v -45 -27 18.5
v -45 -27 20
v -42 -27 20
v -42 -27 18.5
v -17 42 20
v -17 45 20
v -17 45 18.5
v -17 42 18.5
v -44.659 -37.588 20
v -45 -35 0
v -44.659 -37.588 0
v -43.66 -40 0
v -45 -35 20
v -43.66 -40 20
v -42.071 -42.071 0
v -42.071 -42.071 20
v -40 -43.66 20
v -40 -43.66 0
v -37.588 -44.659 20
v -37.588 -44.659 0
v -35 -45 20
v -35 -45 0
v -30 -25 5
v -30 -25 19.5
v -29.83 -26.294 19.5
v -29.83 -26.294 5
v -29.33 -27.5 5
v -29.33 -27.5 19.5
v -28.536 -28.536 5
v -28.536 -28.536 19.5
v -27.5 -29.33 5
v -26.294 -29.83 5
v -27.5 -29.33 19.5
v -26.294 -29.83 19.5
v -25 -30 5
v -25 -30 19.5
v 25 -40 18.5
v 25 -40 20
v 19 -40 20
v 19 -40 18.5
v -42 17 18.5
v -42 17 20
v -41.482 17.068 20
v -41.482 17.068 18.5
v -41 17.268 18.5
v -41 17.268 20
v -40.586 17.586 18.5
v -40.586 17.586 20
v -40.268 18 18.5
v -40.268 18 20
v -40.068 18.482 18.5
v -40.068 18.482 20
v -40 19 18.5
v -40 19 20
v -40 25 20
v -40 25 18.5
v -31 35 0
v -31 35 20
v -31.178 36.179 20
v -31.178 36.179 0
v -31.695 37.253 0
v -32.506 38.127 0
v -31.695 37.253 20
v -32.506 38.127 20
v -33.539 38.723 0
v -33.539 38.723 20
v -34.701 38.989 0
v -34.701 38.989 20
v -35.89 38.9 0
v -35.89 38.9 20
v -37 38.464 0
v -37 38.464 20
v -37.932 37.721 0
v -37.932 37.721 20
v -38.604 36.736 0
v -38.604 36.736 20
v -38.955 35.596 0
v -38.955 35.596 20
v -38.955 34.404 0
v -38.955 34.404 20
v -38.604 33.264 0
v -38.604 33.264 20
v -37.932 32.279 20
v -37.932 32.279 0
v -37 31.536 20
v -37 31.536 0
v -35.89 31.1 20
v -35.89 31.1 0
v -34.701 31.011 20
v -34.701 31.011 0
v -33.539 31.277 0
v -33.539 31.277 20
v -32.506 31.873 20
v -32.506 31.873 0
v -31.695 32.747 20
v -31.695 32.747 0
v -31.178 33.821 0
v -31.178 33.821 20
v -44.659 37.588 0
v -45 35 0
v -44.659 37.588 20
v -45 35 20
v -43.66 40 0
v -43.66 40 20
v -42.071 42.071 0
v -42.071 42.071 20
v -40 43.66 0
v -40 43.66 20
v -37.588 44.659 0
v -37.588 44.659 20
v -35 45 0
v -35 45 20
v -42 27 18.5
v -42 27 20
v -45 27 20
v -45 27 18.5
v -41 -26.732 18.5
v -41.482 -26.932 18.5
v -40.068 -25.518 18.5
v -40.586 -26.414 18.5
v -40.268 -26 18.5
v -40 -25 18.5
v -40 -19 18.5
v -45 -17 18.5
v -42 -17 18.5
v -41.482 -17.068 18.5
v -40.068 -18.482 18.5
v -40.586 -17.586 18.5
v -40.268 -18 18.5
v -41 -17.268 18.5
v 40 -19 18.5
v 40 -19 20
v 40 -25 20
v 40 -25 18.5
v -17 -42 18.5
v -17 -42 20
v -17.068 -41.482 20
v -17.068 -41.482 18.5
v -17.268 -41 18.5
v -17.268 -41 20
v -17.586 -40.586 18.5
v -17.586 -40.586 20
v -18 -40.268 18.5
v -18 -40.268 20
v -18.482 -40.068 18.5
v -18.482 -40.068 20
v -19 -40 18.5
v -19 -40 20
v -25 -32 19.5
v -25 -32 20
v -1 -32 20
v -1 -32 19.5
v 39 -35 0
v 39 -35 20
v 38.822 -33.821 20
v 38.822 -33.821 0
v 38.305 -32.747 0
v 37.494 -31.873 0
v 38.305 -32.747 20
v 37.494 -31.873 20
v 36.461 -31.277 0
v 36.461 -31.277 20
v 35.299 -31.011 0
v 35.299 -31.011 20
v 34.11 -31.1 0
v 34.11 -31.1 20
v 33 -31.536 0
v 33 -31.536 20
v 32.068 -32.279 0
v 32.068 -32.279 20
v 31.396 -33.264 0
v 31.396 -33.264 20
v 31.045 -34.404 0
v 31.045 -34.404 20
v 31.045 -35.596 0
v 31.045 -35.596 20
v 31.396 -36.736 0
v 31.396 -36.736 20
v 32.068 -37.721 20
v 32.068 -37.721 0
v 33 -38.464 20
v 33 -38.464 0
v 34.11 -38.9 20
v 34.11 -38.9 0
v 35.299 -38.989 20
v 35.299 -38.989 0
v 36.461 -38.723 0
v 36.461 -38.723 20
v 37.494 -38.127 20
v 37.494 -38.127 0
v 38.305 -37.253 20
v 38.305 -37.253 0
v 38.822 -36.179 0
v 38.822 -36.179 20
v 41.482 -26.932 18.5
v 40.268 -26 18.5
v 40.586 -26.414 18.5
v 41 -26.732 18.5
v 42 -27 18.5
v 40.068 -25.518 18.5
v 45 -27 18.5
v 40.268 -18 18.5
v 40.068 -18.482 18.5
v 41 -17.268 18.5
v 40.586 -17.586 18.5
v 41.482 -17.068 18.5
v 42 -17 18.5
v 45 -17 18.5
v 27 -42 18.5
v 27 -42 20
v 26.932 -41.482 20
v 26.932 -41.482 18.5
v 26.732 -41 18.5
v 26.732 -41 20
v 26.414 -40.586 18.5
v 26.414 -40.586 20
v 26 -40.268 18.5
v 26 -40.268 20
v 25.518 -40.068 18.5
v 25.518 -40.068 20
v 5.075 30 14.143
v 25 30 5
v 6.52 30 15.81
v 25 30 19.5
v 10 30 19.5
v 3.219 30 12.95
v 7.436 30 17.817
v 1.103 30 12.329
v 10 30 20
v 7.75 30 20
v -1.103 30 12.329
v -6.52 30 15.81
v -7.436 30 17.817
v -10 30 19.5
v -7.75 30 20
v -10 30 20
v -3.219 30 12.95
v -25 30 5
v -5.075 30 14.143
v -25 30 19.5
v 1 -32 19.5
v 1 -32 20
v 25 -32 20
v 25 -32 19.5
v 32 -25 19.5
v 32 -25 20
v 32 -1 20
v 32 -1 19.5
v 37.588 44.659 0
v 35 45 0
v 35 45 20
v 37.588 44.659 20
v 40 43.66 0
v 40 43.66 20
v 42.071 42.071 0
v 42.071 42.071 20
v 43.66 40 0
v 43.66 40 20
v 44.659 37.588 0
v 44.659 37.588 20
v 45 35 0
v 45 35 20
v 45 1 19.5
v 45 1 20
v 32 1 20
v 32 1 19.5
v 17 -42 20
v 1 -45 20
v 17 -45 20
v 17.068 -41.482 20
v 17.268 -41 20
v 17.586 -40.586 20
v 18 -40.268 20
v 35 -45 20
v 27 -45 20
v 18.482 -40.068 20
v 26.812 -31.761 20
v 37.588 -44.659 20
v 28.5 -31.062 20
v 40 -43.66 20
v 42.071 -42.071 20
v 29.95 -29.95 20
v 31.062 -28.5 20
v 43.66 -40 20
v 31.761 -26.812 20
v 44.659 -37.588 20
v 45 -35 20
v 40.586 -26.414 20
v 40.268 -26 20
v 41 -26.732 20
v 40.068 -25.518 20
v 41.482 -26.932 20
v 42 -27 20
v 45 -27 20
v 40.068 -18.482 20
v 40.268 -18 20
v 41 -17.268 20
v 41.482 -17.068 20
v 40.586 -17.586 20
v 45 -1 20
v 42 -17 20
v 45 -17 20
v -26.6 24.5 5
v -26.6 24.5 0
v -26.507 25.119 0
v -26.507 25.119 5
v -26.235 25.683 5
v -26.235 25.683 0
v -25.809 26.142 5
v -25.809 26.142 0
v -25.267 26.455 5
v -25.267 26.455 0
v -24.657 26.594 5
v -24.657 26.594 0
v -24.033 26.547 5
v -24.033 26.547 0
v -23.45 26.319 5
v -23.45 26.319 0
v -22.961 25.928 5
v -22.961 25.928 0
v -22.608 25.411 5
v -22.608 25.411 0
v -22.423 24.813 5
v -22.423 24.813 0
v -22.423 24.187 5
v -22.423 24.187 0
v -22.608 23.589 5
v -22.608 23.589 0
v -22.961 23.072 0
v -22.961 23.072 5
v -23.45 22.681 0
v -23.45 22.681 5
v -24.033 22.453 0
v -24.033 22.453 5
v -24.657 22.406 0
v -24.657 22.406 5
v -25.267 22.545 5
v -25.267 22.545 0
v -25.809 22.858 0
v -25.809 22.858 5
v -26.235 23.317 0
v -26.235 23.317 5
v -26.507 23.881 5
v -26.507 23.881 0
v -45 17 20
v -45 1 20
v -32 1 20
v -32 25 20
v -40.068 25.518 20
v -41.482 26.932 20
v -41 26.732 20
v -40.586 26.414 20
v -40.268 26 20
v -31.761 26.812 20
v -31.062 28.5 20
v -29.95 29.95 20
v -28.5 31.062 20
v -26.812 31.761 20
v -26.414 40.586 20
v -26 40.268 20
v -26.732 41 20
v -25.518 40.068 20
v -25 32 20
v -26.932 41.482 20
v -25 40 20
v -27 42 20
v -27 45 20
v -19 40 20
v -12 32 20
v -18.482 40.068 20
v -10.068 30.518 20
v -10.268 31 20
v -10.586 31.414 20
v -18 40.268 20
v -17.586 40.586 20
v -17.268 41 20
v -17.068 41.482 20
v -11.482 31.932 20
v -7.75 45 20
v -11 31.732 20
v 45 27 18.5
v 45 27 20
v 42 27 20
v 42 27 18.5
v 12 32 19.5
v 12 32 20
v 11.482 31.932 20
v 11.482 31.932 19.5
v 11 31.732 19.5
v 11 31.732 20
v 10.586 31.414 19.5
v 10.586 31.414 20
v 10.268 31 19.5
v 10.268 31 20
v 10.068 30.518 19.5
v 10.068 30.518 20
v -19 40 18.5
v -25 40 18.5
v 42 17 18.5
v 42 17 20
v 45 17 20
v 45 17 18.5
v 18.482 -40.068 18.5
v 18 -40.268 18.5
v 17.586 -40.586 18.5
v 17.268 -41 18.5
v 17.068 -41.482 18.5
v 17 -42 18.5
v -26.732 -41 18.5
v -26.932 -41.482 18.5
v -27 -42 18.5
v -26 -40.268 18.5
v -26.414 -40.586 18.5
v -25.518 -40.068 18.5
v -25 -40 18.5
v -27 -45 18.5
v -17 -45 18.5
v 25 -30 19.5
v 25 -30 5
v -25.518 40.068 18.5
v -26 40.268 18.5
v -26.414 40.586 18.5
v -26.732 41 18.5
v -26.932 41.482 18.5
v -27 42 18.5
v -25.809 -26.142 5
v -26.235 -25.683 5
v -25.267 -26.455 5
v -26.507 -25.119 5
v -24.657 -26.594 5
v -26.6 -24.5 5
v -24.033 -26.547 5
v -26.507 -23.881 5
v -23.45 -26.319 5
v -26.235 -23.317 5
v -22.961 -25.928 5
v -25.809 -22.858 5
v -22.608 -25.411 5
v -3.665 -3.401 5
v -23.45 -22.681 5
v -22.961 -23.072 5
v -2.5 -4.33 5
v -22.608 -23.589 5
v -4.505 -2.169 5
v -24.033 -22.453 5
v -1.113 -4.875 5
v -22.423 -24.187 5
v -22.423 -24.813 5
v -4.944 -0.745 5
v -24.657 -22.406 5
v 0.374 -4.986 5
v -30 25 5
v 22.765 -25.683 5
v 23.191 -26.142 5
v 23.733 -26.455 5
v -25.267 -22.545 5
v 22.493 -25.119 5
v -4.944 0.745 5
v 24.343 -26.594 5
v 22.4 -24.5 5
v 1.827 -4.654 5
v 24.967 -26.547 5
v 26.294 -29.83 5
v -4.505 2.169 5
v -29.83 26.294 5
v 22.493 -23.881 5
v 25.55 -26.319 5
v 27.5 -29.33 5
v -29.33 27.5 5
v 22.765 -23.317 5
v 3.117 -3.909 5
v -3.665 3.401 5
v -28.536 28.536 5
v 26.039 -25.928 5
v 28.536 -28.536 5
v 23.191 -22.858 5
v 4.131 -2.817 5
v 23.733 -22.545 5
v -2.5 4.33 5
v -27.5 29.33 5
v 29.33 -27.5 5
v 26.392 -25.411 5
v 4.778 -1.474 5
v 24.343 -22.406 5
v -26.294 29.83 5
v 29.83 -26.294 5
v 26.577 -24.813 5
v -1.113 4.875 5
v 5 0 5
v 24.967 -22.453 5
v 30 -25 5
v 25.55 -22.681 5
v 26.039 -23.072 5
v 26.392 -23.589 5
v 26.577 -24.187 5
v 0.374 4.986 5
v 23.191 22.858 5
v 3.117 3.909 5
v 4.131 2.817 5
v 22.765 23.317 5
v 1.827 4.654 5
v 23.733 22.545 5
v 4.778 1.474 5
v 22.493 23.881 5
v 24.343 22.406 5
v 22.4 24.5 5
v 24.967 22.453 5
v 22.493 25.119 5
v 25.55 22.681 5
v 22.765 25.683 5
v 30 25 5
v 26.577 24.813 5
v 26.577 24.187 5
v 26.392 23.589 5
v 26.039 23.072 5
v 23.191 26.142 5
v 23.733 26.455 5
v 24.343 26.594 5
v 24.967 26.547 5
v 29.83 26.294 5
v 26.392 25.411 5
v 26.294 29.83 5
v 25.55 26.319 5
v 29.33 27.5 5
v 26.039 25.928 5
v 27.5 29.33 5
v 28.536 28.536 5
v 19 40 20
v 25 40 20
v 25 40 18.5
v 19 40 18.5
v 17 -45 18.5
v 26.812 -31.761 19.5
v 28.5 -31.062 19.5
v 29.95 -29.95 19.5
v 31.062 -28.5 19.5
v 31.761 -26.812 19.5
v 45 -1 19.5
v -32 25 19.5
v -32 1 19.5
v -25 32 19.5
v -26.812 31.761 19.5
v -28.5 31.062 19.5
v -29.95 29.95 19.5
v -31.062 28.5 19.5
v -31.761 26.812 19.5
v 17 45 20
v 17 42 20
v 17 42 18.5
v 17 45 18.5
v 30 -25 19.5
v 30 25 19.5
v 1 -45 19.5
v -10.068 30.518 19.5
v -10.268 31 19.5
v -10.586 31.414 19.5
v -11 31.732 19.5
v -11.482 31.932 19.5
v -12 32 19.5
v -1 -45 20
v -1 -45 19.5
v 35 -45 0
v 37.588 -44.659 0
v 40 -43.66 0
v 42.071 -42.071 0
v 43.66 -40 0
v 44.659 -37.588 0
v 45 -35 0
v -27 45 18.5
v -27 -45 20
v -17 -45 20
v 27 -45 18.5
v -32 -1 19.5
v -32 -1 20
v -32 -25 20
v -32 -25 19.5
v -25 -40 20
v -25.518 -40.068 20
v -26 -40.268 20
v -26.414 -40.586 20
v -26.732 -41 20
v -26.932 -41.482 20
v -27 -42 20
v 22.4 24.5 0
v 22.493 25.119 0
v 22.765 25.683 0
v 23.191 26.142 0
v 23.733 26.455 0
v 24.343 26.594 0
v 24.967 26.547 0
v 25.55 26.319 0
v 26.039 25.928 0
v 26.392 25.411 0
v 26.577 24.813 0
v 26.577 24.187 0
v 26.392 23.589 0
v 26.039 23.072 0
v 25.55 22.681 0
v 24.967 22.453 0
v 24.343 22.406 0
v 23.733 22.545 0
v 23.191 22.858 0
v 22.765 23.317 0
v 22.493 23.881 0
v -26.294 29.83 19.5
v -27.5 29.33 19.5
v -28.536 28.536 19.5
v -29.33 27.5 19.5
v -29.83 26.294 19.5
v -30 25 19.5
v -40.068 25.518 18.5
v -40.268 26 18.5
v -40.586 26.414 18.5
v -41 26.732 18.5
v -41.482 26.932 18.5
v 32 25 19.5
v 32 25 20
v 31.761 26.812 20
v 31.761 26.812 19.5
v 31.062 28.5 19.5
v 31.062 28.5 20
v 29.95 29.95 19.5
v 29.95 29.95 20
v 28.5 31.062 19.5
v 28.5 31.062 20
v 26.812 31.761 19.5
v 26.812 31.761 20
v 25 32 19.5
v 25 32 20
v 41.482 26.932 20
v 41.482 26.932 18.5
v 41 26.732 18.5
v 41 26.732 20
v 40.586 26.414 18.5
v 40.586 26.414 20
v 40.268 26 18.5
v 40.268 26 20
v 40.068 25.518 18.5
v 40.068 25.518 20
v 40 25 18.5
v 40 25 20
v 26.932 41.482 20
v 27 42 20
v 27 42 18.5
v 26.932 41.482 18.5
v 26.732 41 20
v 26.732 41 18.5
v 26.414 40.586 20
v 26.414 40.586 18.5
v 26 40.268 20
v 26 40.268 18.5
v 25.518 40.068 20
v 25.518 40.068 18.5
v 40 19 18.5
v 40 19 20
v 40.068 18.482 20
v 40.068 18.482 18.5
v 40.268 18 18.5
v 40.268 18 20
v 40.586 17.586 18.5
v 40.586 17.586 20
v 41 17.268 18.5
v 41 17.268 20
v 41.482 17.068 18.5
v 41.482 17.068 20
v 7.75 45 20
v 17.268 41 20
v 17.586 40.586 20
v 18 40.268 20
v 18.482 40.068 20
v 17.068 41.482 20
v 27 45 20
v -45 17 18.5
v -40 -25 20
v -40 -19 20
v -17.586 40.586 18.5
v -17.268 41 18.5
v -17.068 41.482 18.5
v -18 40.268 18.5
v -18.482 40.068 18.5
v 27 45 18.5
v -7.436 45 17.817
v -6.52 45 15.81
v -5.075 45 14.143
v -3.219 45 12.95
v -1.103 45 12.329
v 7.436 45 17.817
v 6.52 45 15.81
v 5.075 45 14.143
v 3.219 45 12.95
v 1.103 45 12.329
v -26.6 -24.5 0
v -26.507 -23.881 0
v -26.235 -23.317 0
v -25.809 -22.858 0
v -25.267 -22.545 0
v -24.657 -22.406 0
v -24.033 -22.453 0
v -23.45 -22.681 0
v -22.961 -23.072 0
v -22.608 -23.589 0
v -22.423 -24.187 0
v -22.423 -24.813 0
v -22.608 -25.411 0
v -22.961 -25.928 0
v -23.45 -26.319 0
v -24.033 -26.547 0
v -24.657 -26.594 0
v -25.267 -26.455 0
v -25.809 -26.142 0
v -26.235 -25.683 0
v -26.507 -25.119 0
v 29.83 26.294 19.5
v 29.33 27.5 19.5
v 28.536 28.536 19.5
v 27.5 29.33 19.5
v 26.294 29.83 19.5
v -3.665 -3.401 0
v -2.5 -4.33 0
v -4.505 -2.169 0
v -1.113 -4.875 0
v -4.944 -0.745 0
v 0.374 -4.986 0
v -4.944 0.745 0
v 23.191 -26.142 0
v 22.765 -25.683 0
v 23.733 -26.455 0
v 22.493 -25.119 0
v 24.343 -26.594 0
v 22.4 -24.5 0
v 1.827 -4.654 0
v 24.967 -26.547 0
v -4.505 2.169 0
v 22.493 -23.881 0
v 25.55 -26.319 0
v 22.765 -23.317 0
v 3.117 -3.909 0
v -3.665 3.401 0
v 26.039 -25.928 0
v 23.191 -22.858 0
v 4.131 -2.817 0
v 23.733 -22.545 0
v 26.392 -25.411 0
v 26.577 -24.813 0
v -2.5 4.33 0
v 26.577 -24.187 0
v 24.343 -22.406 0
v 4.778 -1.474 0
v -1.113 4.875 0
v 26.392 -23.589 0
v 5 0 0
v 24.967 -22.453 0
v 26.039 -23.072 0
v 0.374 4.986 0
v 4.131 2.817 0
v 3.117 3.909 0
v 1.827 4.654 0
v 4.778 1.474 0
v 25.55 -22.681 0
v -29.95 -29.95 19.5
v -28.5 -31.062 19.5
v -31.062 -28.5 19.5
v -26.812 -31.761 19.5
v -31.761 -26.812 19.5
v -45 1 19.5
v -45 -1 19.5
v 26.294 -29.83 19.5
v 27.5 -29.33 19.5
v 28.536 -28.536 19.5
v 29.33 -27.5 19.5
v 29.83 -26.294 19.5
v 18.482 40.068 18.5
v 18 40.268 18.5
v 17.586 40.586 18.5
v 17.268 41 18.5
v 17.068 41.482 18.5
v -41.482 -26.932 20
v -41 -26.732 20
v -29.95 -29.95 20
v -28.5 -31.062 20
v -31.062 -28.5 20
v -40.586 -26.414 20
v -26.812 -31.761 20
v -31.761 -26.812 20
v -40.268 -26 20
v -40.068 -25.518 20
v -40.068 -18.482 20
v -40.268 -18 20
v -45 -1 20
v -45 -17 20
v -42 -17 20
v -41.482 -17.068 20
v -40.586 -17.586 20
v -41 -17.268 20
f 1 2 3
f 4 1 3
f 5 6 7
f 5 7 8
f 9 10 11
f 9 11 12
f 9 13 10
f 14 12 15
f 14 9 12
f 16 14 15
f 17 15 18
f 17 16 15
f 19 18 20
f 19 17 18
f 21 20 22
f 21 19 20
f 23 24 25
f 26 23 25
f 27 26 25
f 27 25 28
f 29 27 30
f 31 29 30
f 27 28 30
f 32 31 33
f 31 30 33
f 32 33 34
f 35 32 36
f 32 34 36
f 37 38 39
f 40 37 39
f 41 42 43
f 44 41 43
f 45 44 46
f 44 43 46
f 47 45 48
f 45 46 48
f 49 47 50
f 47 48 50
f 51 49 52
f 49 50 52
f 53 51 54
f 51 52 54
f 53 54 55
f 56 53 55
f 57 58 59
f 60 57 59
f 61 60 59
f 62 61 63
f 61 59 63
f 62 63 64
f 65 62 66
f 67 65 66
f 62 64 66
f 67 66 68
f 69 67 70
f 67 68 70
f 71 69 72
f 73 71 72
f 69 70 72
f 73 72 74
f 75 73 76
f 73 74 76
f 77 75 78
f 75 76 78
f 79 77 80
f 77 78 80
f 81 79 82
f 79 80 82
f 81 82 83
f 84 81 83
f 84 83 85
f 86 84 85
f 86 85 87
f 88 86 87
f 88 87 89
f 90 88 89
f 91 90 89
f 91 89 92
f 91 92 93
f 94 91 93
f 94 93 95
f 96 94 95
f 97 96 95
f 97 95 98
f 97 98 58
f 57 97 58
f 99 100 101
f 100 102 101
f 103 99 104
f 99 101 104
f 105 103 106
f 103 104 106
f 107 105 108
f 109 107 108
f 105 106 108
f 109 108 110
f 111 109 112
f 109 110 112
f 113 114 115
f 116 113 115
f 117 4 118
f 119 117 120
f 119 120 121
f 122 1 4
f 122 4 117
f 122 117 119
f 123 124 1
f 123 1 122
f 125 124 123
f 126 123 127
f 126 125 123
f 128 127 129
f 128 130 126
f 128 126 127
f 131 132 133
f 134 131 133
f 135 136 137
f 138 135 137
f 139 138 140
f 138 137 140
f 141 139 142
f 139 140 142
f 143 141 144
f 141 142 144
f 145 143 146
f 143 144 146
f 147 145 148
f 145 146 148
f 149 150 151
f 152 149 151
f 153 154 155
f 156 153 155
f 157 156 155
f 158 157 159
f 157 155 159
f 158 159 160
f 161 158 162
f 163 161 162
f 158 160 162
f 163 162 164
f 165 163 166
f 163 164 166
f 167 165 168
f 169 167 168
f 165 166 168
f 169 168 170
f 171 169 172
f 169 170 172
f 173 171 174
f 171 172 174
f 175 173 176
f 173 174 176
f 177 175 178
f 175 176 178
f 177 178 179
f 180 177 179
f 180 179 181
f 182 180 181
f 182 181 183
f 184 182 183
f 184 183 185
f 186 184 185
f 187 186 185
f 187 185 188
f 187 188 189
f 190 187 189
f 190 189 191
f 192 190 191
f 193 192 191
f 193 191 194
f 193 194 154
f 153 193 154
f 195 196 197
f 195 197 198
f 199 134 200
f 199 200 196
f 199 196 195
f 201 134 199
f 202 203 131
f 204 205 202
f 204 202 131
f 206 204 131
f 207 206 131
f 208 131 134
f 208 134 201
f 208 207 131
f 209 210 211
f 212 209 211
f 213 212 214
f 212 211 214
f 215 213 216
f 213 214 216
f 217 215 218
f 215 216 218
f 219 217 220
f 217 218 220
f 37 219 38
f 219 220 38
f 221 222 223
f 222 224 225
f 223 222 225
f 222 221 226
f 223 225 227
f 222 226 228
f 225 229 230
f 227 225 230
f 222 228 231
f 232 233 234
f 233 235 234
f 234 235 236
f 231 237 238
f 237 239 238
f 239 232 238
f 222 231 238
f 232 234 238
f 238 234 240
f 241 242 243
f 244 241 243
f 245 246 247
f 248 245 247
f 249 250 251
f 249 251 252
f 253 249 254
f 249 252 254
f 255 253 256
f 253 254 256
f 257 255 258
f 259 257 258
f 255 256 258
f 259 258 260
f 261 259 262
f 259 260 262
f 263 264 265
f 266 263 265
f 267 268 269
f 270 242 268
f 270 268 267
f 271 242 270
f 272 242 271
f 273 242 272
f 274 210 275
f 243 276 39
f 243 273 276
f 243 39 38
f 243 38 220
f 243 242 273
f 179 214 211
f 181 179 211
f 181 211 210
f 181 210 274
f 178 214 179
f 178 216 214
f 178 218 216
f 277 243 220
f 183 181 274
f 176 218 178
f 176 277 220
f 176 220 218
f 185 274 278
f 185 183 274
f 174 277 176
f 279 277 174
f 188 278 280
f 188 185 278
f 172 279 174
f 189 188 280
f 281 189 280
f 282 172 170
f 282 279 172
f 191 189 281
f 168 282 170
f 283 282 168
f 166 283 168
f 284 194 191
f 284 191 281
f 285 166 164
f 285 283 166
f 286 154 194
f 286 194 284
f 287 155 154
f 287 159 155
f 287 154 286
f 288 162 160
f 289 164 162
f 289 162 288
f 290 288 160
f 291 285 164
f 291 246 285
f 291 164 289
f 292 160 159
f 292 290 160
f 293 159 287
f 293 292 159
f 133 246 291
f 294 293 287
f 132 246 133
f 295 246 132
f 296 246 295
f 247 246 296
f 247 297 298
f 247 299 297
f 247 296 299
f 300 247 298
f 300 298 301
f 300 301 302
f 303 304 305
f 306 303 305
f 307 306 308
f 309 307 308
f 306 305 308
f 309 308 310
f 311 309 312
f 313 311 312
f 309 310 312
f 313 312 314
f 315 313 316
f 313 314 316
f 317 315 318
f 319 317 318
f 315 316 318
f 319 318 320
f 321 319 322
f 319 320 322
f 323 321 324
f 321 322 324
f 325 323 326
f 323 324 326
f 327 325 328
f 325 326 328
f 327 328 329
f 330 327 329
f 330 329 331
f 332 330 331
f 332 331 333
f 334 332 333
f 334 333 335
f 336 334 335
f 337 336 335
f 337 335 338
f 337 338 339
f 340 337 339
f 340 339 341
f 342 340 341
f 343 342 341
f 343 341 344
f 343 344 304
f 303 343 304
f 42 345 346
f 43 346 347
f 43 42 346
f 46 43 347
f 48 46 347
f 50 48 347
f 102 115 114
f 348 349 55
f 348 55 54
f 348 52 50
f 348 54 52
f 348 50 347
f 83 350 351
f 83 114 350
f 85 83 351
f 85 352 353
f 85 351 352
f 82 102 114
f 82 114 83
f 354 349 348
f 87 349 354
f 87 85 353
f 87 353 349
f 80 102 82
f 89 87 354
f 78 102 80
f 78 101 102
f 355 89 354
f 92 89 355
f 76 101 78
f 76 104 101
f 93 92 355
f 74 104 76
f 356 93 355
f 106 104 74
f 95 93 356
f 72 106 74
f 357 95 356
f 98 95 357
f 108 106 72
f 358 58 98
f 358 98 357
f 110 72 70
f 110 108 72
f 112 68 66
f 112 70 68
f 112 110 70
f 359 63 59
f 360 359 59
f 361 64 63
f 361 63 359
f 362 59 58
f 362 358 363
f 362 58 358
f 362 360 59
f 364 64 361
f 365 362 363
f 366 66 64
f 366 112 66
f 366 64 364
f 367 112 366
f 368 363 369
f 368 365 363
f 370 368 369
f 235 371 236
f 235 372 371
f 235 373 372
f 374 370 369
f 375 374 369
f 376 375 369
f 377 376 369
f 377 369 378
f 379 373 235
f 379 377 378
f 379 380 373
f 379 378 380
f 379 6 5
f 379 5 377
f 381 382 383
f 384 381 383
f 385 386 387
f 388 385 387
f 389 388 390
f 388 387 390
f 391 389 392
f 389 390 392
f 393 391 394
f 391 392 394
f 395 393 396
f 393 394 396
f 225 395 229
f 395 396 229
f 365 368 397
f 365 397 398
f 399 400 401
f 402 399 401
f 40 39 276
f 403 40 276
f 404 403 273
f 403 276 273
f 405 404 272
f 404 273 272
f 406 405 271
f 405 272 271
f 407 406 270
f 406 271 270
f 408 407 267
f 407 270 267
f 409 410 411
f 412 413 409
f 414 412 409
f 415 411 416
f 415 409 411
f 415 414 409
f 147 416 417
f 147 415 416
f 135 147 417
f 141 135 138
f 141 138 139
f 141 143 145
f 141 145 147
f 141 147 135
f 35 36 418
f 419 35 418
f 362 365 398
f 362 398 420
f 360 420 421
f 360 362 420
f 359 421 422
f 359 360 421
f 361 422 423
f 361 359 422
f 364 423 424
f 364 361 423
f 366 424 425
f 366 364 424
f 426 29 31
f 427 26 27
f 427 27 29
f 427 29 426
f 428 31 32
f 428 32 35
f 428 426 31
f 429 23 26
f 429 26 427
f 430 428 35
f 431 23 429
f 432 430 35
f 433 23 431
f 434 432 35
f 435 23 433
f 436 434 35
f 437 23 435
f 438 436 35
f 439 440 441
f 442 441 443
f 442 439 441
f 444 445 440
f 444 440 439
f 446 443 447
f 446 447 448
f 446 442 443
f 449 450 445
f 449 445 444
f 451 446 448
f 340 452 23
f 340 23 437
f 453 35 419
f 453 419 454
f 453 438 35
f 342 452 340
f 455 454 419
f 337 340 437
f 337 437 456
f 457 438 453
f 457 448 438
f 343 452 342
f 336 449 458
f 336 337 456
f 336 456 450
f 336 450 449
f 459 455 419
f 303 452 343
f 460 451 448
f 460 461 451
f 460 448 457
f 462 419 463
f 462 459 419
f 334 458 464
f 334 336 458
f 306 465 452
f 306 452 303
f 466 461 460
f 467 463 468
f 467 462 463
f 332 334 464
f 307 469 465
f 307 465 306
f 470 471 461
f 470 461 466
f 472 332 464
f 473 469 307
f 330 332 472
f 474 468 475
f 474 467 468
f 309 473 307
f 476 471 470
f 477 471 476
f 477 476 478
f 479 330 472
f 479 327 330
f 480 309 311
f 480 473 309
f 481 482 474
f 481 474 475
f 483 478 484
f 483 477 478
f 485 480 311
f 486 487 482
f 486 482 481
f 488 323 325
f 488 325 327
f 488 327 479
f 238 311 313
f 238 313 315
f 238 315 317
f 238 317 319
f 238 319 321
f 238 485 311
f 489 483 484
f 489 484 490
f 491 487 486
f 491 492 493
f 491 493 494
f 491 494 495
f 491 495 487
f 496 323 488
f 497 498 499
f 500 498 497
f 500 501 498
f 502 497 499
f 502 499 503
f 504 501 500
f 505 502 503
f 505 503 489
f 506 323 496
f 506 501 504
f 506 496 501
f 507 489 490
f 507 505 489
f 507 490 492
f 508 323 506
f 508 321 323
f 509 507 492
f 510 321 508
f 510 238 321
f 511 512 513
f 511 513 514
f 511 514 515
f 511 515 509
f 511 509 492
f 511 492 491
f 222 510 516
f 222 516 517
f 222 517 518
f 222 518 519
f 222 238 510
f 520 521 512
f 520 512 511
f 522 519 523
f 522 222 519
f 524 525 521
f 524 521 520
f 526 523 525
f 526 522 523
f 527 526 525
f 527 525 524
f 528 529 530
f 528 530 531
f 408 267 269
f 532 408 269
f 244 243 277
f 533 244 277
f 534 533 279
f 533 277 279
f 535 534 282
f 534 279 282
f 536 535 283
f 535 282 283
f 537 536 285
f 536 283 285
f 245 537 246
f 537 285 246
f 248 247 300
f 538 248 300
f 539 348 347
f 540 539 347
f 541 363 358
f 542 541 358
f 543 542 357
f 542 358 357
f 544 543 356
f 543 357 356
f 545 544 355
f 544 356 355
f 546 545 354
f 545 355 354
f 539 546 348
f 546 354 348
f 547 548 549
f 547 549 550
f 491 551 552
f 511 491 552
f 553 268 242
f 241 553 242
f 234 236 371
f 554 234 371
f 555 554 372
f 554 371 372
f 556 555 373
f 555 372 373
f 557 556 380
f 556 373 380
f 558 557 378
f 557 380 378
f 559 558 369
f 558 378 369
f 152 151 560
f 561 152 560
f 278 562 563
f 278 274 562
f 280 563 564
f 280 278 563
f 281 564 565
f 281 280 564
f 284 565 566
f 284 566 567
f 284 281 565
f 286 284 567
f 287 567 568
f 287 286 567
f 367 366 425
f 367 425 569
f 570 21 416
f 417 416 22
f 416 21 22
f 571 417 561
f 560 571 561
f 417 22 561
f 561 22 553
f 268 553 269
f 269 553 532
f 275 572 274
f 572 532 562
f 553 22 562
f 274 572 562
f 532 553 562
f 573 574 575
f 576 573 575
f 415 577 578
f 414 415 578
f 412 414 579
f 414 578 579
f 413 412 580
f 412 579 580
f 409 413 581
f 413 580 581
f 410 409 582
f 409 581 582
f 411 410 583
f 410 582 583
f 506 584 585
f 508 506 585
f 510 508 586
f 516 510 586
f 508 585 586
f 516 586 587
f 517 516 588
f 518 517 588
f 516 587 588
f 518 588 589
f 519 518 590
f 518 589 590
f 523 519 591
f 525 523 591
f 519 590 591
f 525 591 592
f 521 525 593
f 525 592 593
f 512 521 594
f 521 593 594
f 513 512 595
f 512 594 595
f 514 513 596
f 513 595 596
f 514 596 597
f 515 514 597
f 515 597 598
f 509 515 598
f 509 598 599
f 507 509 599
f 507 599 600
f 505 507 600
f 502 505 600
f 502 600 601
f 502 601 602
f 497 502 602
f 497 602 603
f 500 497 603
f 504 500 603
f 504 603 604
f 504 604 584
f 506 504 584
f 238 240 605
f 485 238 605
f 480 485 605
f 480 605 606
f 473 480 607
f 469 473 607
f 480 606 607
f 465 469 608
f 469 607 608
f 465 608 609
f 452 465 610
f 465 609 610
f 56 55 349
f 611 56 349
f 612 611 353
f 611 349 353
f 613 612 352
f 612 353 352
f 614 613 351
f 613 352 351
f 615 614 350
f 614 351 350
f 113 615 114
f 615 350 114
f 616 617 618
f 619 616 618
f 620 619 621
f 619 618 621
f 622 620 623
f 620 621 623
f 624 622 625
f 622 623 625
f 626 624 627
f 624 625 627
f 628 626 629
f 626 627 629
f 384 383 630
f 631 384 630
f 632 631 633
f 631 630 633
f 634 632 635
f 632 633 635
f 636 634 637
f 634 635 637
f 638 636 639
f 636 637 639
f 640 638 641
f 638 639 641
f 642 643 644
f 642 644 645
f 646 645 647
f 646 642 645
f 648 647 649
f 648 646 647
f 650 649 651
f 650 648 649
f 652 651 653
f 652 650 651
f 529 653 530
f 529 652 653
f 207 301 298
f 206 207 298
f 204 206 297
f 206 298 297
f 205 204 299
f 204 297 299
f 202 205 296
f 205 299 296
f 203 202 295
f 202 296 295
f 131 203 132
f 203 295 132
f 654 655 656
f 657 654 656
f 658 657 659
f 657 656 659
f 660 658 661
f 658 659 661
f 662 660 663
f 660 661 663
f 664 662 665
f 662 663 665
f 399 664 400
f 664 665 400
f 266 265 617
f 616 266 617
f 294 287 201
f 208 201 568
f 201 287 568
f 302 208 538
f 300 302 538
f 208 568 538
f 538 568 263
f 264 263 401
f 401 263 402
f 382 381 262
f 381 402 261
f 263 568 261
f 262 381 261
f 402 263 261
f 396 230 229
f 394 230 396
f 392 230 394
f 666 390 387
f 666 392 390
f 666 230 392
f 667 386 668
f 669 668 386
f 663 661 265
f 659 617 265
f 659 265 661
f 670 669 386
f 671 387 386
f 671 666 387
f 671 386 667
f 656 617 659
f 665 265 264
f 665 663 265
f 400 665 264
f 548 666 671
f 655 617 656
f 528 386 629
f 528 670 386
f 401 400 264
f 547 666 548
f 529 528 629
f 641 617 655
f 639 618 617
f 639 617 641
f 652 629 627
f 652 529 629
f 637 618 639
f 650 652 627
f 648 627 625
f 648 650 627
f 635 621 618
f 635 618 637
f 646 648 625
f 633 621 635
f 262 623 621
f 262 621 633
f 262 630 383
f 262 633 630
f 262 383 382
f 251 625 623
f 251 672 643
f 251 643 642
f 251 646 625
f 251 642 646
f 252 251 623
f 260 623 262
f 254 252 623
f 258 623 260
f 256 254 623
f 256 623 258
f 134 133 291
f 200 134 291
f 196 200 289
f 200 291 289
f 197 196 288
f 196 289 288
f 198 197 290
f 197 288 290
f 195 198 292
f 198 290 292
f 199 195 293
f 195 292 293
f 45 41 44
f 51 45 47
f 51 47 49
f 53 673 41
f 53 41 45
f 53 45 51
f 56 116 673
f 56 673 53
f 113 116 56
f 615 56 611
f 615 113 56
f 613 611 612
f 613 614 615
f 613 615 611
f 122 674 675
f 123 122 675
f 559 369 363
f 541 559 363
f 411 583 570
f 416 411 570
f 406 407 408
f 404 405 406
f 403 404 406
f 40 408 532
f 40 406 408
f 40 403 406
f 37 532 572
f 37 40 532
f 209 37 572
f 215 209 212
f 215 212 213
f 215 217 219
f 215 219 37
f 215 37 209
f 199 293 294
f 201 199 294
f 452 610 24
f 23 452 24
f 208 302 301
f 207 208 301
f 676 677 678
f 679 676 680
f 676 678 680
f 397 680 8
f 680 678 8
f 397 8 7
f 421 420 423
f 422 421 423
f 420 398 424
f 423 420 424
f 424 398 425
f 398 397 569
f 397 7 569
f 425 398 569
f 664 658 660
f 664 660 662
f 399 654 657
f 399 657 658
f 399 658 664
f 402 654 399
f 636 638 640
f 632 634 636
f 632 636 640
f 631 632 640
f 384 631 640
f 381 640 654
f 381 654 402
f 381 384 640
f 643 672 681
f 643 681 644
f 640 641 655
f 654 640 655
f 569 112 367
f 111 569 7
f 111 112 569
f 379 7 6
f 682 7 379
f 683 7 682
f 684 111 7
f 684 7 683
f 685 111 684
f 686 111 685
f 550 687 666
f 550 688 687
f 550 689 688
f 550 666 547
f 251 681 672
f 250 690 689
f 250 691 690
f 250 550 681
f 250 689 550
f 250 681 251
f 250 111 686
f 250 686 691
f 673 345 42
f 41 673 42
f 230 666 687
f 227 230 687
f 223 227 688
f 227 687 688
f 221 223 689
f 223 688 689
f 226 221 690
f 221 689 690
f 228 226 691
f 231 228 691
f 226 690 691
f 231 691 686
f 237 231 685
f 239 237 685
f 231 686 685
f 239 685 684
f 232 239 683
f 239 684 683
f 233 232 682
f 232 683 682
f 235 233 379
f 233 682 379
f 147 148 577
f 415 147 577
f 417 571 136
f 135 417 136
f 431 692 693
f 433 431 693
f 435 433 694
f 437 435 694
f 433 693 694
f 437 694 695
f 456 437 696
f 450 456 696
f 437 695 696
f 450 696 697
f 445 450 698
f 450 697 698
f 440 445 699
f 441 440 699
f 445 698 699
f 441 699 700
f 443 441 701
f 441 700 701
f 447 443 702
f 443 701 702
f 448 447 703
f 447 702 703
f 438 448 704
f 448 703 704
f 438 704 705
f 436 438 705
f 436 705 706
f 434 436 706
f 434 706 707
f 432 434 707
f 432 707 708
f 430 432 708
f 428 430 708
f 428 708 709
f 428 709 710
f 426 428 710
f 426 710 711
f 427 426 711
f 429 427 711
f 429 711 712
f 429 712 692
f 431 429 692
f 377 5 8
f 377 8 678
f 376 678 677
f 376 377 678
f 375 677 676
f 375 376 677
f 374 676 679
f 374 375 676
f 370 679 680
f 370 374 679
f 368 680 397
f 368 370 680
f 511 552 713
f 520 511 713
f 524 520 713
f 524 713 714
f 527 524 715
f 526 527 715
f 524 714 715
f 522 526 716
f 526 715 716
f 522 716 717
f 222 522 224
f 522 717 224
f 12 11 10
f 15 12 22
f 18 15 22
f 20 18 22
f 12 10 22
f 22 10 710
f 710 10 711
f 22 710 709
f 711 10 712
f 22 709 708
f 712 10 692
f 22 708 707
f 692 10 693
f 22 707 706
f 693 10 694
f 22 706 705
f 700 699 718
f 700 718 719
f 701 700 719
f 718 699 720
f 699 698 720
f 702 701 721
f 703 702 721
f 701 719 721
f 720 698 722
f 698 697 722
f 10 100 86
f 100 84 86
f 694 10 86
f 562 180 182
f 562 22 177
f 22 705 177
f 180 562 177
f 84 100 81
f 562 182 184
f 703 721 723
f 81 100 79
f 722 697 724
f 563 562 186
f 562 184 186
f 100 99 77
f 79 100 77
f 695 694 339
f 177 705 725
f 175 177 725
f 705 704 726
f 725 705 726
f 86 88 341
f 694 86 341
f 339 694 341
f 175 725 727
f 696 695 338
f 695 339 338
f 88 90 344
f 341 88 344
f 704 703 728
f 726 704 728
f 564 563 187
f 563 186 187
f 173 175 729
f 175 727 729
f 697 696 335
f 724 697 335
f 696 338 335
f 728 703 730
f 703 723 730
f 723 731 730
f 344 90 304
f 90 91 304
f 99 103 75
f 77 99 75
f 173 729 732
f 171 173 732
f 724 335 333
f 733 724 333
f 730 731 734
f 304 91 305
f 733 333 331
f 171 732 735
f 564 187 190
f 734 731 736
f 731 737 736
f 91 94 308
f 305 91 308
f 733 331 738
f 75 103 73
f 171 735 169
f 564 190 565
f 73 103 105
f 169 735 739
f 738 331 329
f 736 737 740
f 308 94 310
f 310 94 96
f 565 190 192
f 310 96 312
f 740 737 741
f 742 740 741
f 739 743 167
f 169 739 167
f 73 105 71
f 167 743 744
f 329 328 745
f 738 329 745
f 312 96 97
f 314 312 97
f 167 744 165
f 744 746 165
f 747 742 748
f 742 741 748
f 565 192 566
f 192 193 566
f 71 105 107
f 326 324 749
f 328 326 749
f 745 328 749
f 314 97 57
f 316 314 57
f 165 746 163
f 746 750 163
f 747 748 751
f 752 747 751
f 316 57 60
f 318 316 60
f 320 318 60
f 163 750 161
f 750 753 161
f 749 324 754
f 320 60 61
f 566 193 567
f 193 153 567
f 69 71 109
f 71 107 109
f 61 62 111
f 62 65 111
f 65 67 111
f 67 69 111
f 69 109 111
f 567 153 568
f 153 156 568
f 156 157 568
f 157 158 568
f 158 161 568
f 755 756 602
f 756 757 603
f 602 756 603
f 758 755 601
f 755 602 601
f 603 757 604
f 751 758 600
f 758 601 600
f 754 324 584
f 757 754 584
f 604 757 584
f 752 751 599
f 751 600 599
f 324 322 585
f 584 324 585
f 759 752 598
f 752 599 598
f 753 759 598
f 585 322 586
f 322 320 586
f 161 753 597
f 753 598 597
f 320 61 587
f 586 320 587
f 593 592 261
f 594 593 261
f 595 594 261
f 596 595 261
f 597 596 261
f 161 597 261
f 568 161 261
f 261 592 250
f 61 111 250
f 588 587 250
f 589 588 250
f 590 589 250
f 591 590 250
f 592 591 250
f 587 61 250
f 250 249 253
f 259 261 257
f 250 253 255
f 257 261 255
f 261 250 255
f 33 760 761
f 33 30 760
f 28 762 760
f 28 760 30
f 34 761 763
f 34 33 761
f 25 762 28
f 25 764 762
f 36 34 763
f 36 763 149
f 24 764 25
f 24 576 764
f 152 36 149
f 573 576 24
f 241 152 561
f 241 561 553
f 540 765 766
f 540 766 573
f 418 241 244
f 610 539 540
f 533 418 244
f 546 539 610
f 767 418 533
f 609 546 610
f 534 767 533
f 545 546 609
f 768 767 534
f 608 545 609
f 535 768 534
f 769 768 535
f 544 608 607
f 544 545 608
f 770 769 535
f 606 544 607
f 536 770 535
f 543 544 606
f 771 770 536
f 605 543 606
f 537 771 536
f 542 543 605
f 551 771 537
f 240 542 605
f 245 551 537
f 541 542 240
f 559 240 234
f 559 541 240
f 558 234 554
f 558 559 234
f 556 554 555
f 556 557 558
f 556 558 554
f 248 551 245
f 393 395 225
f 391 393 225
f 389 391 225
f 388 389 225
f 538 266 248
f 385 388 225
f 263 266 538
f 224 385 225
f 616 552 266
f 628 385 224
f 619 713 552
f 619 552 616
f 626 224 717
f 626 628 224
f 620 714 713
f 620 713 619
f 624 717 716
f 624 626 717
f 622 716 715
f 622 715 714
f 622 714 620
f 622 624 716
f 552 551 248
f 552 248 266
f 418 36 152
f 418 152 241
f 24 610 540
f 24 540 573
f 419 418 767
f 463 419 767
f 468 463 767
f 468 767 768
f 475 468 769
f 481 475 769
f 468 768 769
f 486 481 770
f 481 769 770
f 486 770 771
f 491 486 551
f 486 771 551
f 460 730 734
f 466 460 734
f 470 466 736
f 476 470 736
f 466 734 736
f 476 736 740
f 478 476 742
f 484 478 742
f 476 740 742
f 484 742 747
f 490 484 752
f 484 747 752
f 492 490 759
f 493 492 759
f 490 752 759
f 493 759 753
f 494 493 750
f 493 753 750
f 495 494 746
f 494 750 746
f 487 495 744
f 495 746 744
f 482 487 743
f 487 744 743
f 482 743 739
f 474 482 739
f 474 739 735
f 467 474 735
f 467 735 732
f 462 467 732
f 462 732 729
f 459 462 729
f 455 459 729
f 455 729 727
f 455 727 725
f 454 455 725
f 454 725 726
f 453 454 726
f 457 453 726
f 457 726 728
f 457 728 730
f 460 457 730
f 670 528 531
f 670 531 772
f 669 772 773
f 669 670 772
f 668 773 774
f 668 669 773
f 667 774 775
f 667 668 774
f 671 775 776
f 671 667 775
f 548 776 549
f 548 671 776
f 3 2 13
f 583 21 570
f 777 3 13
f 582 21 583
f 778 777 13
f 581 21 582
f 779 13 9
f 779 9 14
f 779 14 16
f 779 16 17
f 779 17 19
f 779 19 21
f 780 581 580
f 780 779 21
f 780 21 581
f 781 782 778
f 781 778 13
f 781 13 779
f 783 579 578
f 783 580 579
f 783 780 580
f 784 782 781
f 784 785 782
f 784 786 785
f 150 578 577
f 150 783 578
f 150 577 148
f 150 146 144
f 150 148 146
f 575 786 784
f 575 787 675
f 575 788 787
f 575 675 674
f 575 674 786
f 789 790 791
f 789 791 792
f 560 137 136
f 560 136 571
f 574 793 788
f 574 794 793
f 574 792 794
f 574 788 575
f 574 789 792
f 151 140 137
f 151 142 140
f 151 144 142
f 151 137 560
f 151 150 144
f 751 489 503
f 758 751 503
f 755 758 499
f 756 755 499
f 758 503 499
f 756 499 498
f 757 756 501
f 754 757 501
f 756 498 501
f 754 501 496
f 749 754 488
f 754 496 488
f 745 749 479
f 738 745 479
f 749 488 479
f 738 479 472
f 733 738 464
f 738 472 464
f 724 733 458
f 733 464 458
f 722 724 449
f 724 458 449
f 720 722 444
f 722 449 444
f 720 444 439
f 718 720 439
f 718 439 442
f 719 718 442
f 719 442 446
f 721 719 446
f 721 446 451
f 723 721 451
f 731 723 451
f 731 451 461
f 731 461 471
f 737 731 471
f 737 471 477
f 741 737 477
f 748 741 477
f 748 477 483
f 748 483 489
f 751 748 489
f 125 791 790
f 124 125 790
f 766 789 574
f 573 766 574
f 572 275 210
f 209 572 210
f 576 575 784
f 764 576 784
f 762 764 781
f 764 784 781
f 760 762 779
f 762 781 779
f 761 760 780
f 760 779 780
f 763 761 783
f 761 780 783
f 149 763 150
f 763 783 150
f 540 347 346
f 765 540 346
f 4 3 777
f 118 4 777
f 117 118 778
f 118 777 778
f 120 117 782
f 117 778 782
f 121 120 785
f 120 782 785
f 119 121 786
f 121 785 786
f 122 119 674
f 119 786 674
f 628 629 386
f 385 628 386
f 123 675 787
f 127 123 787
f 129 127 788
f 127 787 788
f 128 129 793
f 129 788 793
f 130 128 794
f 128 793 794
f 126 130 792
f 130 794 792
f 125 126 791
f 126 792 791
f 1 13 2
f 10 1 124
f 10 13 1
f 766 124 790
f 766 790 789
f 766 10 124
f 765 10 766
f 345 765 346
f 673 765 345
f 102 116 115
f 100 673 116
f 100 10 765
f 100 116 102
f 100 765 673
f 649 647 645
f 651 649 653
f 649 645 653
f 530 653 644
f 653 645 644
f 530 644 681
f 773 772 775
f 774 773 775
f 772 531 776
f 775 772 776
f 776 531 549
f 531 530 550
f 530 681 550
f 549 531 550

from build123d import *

# Parameters (mm, degrees)
ESQUISSE1_W             = 90
ESQUISSE1_H             = 90
BOSS_EXTRU_1_DEPTH      = 20
ENL_V_MAT_EXTRU_1_DEPTH = 15
ENL_V_MAT_EXTRU_2_DEPTH = 0.5
CONG_1_R                = 10
ESQUISSE6_R             = 4
ENL_V_MAT_EXTRU_4_DEPTH = 21
ESQUISSE7_R             = 5
ENL_V_MAT_EXTRU_5_DEPTH = 6
ENL_V_MAT_EXTRU_6_DEPTH = 1.5
TROU_TARAUD_M51_D       = 4.2
TROU_TARAUD_M51_DEPTH   = 14
TROU_TARAUD_M51_TIP     = 1.2618073
ENL_V_MAT_EXTRU_7_REACH = 92
ESQUISSE4_R             = 7.75


with BuildPart() as part:
    # Esquisse1 → Boss.-Extru.1 (new body)
    with BuildSketch(Plane.XY):
        Rectangle(ESQUISSE1_W, ESQUISSE1_H)
    extrude(amount=BOSS_EXTRU_1_DEPTH)

    # Esquisse2 → Enlèv. mat.-Extru.1 (cut)
    with BuildSketch(Plane.XY.offset(20)):
        with BuildLine():
            Line((-25, -30), (25, -30))
            ThreePointArc((25, -30), (28.535533906, -28.535533906), (30, -25))
            Line((30, -25), (30, 25))
            ThreePointArc((30, 25), (28.535533906, 28.535533906), (25, 30))
            Line((25, 30), (-25, 30))
            ThreePointArc((-25, 30), (-28.535533906, 28.535533906), (-30, 25))
            Line((-30, 25), (-30, -25))
            ThreePointArc((-30, -25), (-28.535533906, -28.535533906), (-25, -30))
        make_face()
    extrude(amount=-ENL_V_MAT_EXTRU_1_DEPTH, mode=Mode.SUBTRACT)

    # Esquisse3 → Enlèv. mat.-Extru.2 (cut)
    with BuildSketch(Plane.XY.offset(20)):
        with BuildLine():
            Line((25, 32), (12, 32))
            ThreePointArc((12, 32), (10.585786438, 31.414213562), (10, 30))
            Line((10, 30), (25, 30))
            ThreePointArc((25, 30), (28.535533906, 28.535533906), (30, 25))
            Line((30, 25), (30, -25))
            ThreePointArc((30, -25), (28.535533906, -28.535533906), (25, -30))
            Line((25, -30), (-25, -30))
            ThreePointArc((-25, -30), (-28.535533906, -28.535533906), (-30, -25))
            Line((-30, -25), (-30, 25))
            ThreePointArc((-30, 25), (-28.535533906, 28.535533906), (-25, 30))
            Line((-25, 30), (-10, 30))
            ThreePointArc((-10, 30), (-10.585786437, 31.414213561), (-11.999999997, 32))
            Line((-11.999999997, 32), (-25, 32))
            ThreePointArc((-25, 32), (-29.949747468, 29.949747468), (-32, 25))
            Line((-32, 25), (-32, 1))
            Line((-32, 1), (-45, 1))
            Line((-45, 1), (-45, -1))
            Line((-45, -1), (-32, -1))
            Line((-32, -1), (-32, -25))
            ThreePointArc((-32, -25), (-29.949747468, -29.949747468), (-25, -32))
            Line((-25, -32), (-1, -32))
            Line((-1, -32), (-1, -45))
            Line((-1, -45), (1, -45))
            Line((1, -45), (1, -32))
            Line((1, -32), (25, -32))
            ThreePointArc((25, -32), (29.949747468, -29.949747468), (32, -25))
            Line((32, -25), (32, -1))
            Line((32, -1), (45, -1))
            Line((45, -1), (45, 1))
            Line((45, 1), (32, 1))
            Line((32, 1), (32, 25))
            ThreePointArc((32, 25), (29.949747468, 29.949747468), (25, 32))
        make_face()
    extrude(amount=-ENL_V_MAT_EXTRU_2_DEPTH, mode=Mode.SUBTRACT)

    # Congé1
    cong_1_edges = [part.edges().sort_by_distance(p)[0] for p in [
        (45, -45, 10),
        (-45, -45, 10),
        (-45, 45, 10),
        (45, 45, 10),
    ]]
    fillet(cong_1_edges, radius=CONG_1_R)

    # Esquisse6 → Enlèv. mat.-Extru.4 (cut, through all)
    with BuildSketch(Plane.XY.offset(20)):
        with Locations((-35, 35)):
            Circle(ESQUISSE6_R)
        with Locations((35, -35)):
            Circle(ESQUISSE6_R)
    extrude(amount=-ENL_V_MAT_EXTRU_4_DEPTH, mode=Mode.SUBTRACT)

    # Esquisse7 → Enlèv. mat.-Extru.5 (cut, through all)
    with BuildSketch(Plane.XY.offset(5)):
        Circle(ESQUISSE7_R)
    extrude(amount=-ENL_V_MAT_EXTRU_5_DEPTH, mode=Mode.SUBTRACT)

    # Esquisse8 → Enlèv. mat.-Extru.6 (cut)
    with BuildSketch(Plane.XY.offset(20)):
        with BuildLine():
            Line((-27, 45), (-17, 45))
            Line((-17, 45), (-17, 42))
            ThreePointArc((-17, 42), (-17.585786438, 40.585786438), (-19, 40))
            Line((-19, 40), (-25, 40))
            ThreePointArc((-25, 40), (-26.414213562, 40.585786438), (-27, 42))
            Line((-27, 42), (-27, 45))
        make_face()
        with BuildLine():
            Line((17, 45), (27, 45))
            Line((27, 45), (27, 42))
            ThreePointArc((27, 42), (26.414213562, 40.585786438), (25, 40))
            Line((25, 40), (19, 40))
            ThreePointArc((19, 40), (17.585786438, 40.585786438), (17, 42))
            Line((17, 42), (17, 45))
        make_face()
        with BuildLine():
            Line((45, 27), (42, 27))
            ThreePointArc((42, 27), (40.585786438, 26.414213562), (40, 25))
            Line((40, 25), (40, 19))
            ThreePointArc((40, 19), (40.585786438, 17.585786438), (42, 17))
            Line((42, 17), (45, 17))
            Line((45, 17), (45, 27))
        make_face()
        with BuildLine():
            Line((45, -17), (42, -17))
            ThreePointArc((42, -17), (40.585786438, -17.585786438), (40, -19))
            Line((40, -19), (40, -25))
            ThreePointArc((40, -25), (40.585786438, -26.414213562), (42, -27))
            Line((42, -27), (45, -27))
            Line((45, -27), (45, -17))
        make_face()
        with BuildLine():
            Line((27, -45), (27, -42))
            ThreePointArc((27, -42), (26.414213562, -40.585786438), (25, -40))
            Line((25, -40), (19, -40))
            ThreePointArc((19, -40), (17.585786438, -40.585786438), (17, -42))
            Line((17, -42), (17, -45))
            Line((17, -45), (27, -45))
        make_face()
        with BuildLine():
            Line((-17, -45), (-17, -42))
            ThreePointArc((-17, -42), (-17.585786438, -40.585786438), (-19, -40))
            Line((-19, -40), (-25, -40))
            ThreePointArc((-25, -40), (-26.414213562, -40.585786438), (-27, -42))
            Line((-27, -42), (-27, -45))
            Line((-27, -45), (-17, -45))
        make_face()
        with BuildLine():
            Line((-45, -27), (-42, -27))
            ThreePointArc((-42, -27), (-40.585786438, -26.414213562), (-40, -25))
            Line((-40, -25), (-40, -19))
            ThreePointArc((-40, -19), (-40.585786438, -17.585786438), (-42, -17))
            Line((-42, -17), (-45, -17))
            Line((-45, -17), (-45, -27))
        make_face()
        with BuildLine():
            Line((-45, 17), (-42, 17))
            ThreePointArc((-42, 17), (-40.585786438, 17.585786438), (-40, 19))
            Line((-40, 19), (-40, 25))
            ThreePointArc((-40, 25), (-40.585786438, 26.414213562), (-42, 27))
            Line((-42, 27), (-45, 27))
            Line((-45, 27), (-45, 17))
        make_face()
    extrude(amount=-ENL_V_MAT_EXTRU_6_DEPTH, mode=Mode.SUBTRACT)

    # Trou taraudé M51
    with Locations(Plane(origin=(-24.5, 24.5, 5), x_dir=(1, 0, 0), z_dir=(0, 0, 1))):
        with Locations((0, 0), (49, 0), (49, -49), (0, -49)):
            Hole(TROU_TARAUD_M51_D / 2, depth=TROU_TARAUD_M51_DEPTH)
            with Locations((0, 0, -(TROU_TARAUD_M51_DEPTH + TROU_TARAUD_M51_TIP / 2))):  # 118° drill point
                Cone(0, TROU_TARAUD_M51_D / 2, TROU_TARAUD_M51_TIP, mode=Mode.SUBTRACT)

    # Esquisse4 → Enlèv. mat.-Extru.7 (cut, up to next)
    with BuildSketch(Plane(origin=(0, 45, 0), x_dir=(1, 0, 0), z_dir=(0, 1, 0)), mode=Mode.PRIVATE) as enl_v_mat_extru_7_sk1:
        with Locations((0, -20)):
            Circle(ESQUISSE4_R)
    enl_v_mat_extru_7_tool1 = extrude(enl_v_mat_extru_7_sk1.sketch, amount=-ENL_V_MAT_EXTRU_7_REACH, mode=Mode.PRIVATE) & part.part
    add(enl_v_mat_extru_7_tool1.solids().sort_by_distance((0, 45, 20))[0], mode=Mode.SUBTRACT)


solid = part.part
